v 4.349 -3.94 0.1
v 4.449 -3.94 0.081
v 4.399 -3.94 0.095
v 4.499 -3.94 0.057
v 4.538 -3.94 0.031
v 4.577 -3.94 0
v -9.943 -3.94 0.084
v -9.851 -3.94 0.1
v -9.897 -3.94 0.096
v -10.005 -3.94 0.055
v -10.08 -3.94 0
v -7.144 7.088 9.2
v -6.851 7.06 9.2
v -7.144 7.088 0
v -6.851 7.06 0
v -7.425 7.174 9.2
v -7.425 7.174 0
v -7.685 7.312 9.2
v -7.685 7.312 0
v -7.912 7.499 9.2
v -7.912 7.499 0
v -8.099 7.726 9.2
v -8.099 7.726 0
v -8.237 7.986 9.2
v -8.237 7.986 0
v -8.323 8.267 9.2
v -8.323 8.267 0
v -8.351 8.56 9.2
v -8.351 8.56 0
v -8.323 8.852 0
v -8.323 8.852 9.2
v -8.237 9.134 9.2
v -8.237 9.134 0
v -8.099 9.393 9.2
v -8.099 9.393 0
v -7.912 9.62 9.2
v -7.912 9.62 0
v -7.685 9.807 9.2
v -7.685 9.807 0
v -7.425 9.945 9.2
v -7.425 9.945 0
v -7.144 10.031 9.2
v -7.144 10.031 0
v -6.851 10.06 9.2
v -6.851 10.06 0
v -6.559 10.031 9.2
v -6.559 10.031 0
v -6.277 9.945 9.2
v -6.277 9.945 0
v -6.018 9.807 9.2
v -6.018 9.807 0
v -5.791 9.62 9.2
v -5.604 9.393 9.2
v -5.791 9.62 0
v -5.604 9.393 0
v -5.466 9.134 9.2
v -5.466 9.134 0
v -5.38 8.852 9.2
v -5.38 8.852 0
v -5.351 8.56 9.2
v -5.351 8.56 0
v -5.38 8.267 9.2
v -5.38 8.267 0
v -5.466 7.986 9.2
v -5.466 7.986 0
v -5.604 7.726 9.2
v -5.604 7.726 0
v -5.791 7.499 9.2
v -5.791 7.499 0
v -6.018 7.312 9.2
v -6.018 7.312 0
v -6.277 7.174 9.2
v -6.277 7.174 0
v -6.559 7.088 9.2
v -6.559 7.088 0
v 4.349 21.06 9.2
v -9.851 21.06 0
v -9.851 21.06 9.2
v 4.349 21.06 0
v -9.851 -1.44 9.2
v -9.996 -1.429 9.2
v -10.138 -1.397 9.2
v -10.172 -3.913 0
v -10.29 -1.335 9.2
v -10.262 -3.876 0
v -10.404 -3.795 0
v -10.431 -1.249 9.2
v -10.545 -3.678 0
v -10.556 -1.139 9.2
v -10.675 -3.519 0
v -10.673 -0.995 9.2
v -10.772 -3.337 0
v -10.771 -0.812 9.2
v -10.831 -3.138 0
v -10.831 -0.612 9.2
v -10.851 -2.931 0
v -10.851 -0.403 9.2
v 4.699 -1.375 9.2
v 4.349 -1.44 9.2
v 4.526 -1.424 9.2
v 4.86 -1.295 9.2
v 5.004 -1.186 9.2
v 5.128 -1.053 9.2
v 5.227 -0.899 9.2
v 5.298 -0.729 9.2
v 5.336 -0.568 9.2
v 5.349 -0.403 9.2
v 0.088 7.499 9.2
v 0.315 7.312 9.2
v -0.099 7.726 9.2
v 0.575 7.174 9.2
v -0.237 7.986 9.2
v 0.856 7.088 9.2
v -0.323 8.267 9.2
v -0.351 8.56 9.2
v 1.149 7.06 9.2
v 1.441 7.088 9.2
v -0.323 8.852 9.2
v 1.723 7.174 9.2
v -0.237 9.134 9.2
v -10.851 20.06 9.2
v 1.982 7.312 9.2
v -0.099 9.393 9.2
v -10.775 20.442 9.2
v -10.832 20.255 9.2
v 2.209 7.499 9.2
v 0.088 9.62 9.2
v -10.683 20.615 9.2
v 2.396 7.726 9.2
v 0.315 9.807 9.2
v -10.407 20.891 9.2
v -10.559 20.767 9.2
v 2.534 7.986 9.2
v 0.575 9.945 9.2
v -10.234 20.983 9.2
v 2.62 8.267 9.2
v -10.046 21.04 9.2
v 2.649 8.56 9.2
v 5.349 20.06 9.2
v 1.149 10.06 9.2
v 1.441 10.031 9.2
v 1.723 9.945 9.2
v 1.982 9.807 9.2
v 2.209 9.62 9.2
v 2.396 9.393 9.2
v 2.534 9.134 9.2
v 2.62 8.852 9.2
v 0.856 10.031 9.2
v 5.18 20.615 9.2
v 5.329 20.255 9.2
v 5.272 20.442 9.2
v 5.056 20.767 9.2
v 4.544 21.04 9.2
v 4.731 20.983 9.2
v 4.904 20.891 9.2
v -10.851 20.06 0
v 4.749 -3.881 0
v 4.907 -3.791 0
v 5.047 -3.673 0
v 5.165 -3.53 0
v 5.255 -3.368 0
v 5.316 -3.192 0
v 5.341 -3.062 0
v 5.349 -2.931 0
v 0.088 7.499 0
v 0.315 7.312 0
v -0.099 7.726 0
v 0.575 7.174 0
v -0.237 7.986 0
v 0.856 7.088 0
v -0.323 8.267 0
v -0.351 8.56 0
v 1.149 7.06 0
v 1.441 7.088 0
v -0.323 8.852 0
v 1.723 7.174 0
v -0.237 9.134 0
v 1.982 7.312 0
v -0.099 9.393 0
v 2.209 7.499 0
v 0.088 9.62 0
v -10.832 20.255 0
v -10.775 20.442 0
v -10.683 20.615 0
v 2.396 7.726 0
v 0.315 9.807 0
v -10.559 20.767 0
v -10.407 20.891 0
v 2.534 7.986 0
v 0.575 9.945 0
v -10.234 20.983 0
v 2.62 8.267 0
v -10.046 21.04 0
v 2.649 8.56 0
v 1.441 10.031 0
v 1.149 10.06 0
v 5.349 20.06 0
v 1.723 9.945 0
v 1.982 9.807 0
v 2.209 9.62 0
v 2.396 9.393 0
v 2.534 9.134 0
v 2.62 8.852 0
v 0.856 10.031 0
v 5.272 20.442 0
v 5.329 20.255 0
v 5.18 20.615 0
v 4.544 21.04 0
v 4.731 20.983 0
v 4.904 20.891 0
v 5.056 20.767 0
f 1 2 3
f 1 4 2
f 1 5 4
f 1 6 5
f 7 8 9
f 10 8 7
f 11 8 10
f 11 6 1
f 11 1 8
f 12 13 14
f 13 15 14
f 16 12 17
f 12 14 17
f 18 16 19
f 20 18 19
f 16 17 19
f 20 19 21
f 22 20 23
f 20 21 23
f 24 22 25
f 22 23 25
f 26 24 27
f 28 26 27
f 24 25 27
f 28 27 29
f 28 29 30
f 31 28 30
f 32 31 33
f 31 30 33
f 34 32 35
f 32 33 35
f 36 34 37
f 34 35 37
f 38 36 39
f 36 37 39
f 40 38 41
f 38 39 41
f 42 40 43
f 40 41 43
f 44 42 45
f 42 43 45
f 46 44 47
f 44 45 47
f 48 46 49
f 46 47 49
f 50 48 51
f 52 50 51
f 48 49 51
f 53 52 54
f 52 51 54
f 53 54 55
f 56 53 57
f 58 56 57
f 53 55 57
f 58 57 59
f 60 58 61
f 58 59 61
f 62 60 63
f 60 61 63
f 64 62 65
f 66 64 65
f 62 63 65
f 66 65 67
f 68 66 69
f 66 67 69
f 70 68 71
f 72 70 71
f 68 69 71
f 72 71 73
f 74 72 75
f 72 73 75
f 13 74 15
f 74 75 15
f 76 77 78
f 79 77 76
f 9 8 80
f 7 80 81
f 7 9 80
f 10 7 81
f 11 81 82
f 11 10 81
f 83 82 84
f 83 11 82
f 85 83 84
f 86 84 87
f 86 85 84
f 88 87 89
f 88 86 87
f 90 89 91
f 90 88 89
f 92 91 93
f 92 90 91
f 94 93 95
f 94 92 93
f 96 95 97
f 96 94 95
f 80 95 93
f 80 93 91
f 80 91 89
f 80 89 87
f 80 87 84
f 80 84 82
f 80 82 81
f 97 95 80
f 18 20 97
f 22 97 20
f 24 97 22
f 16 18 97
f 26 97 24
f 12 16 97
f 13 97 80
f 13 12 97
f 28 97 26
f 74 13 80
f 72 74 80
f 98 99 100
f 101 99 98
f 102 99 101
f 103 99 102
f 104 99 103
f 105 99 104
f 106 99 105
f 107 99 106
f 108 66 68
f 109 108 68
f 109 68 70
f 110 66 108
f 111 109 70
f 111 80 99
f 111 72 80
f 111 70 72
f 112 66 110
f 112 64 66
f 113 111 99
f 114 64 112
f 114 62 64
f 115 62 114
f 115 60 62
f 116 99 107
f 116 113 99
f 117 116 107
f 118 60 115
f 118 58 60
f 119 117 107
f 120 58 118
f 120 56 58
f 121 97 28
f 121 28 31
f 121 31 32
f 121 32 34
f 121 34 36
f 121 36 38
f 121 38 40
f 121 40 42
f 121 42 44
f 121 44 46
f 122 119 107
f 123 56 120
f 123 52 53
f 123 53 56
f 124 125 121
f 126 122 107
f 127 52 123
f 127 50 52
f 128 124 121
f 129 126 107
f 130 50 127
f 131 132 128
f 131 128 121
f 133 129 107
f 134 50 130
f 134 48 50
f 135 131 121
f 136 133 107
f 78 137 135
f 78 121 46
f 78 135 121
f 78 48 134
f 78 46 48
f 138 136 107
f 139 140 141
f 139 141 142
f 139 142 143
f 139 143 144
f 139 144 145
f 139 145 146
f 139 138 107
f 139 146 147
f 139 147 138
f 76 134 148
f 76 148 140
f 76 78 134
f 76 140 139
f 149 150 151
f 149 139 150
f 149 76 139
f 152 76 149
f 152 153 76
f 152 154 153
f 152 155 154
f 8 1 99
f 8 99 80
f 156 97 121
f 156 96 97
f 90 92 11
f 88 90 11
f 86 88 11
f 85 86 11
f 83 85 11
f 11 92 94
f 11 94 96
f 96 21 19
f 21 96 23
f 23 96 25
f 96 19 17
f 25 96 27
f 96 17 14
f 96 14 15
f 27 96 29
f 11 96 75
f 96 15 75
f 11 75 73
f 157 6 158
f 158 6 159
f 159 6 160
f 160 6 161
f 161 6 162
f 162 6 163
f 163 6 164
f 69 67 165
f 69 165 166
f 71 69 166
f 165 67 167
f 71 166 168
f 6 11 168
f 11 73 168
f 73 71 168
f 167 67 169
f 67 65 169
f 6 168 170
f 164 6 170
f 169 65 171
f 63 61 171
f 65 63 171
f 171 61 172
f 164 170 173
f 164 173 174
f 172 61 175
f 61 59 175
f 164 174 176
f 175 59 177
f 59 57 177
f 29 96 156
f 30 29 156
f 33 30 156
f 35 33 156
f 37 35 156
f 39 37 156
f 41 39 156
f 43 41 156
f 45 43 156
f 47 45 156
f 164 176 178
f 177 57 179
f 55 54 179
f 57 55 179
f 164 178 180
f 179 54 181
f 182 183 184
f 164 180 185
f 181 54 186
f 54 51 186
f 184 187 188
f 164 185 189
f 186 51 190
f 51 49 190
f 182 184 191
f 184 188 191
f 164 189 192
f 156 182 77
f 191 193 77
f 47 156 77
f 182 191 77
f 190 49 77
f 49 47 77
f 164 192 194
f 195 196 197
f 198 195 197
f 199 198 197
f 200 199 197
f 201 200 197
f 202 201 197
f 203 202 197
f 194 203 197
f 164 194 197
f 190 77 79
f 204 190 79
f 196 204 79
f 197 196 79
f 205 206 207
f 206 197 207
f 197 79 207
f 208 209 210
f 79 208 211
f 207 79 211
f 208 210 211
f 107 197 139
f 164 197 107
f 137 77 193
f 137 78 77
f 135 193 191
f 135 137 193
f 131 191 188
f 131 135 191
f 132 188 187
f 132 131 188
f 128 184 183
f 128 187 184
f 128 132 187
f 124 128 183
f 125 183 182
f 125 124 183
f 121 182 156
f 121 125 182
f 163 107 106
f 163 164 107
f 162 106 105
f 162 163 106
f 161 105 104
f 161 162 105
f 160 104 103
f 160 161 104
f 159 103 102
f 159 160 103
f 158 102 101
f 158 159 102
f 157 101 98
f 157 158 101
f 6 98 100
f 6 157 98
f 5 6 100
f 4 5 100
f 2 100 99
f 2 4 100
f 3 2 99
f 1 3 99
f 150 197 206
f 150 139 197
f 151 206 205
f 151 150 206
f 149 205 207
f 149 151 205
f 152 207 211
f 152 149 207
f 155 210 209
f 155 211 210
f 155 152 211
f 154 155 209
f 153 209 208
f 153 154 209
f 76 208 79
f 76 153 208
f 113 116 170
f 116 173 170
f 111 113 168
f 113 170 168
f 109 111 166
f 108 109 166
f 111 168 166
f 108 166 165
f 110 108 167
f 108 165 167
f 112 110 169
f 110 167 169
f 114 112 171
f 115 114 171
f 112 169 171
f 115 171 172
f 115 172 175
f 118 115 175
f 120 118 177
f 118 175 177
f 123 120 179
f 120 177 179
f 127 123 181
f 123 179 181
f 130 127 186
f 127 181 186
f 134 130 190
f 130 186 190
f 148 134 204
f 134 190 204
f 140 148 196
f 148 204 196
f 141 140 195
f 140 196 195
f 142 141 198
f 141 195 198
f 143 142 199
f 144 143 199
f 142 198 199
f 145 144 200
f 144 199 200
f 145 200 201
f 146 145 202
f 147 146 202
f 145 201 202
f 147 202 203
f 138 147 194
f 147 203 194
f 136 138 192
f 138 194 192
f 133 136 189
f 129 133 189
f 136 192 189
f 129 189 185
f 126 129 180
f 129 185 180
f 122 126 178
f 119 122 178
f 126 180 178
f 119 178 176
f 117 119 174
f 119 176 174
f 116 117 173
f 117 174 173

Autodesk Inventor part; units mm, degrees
ref_plane "YZ Plane" through (0, 0, 0) normal (1, 0, 0) x (0, 1, 0)
ref_plane "XZ Plane" through (0, 0, 0) normal (0, 1, 0) x (-1, 0, 0)
ref_plane "XY Plane" through (0, 0, 0) normal (0, 0, 1) x (1, 0, 0)
sketch "Szkic1" plane through (0, 0, 0) normal (0, 0, 1) x (1, 0, 0)
  line L0 (-10.8514, 21.0596) -> (5.3486, 21.0596)
  line L1 (5.3486, 21.0596) -> (5.3486, -3.9404)
  line L2 (5.3486, -3.9404) -> (-10.8514, -3.9404)
  line L3 (-10.8514, -3.9404) -> (-10.8514, 21.0596)
  point P0 (0, 0)
  dimension "d0" = 16.2
  dimension "d1" = 25
extrude "Wyciągnięcie proste1" add sketch "Szkic1" along normal blind 9.2
sketch "Szkic2" plane through (0, 0, 9.2) normal (0, 0, 1) x (1, 0, 0)
  line L0 (5.3486, 21.0596) -> (-10.8514, 21.0596) projected
  line L1 (-10.8514, 21.0596) -> (-10.8514, -3.9404) projected
  line L2 (-10.8514, -3.9404) -> (5.3486, -3.9404) projected
  line L3 (5.3486, -3.9404) -> (5.3486, 21.0596) projected
  point P0 (0, 0)
  point P1 (-6.8514, 8.5596)
  point P2 (1.1486, 8.5596)
  dimension "d4" = 12.5
  dimension "d5" = 12.5
  dimension "d6" = 4
  dimension "d7" = 4.2
hole "Otwór1" at (-6.8514, 8.5596, 9.2) at (1.1486, 8.5596, 9.2) direction (0, 0, -1) diameter 3 end through all
chamfer "Faza3" distance 2.5 distance2 9.1 1 edges at (-2.7514, -3.9404, 9.2) measured on face at (-1.6837, 17.3356, 9.2)
fillet "Zaokrąglenie1" radius 1 4 edges at (-10.8514, 21.0596, 4.6) (5.3486, -2.6904, 4.65) (-10.8514, -2.6904, 4.65) (5.3486, 21.0596, 4.6)
equation "\"d5\" = d4"
properties part number "3DP_ABS_X_Axis_IGUS_Cable_Chain_Mount"
